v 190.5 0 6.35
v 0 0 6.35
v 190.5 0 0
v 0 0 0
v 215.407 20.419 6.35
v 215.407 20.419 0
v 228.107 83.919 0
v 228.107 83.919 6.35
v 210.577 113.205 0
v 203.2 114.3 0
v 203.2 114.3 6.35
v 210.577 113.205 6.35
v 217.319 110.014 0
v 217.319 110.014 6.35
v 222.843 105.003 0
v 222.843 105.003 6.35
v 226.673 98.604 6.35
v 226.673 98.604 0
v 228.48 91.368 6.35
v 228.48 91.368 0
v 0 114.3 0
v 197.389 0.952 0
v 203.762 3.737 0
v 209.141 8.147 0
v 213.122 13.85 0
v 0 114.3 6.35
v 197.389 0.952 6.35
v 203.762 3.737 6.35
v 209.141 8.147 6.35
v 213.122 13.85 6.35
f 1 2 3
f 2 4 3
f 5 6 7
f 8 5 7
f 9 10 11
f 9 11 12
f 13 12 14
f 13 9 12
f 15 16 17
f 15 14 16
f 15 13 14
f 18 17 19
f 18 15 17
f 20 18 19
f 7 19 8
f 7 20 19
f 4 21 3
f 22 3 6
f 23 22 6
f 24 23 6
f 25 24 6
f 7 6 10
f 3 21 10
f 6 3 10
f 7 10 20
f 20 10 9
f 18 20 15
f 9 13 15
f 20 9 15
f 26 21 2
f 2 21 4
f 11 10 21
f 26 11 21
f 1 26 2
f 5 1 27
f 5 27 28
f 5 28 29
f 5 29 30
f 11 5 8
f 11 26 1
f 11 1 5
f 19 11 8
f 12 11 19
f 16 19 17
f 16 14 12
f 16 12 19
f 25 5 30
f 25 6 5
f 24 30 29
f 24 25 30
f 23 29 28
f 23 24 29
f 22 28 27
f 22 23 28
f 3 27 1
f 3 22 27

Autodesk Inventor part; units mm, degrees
ref_plane "YZ Plane" through (0, 0, 0) normal (1, 0, 0) x (0, 1, 0)
ref_plane "XZ Plane" through (0, 0, 0) normal (0, 1, 0) x (-1, 0, 0)
ref_plane "XY Plane" through (0, 0, 0) normal (0, 0, 1) x (1, 0, 0)
sketch "Sketch1" plane through (0, 0, 0) normal (0, 0, 1) x (1, 0, 0)
  line L0 (0, 0) -> (190.5, 0)
  arc A0 (190.5, 0) -> (215.4067, 20.4187) centre (190.5, 25.4) ccw
  line L1 (215.4067, 20.4187) -> (228.1067, 83.9187)
  arc A1 (228.1067, 83.9187) -> (203.2, 114.3) centre (203.2, 88.9) ccw
  line L2 (203.2, 114.3) -> (0, 114.3)
  line L3 (0, 114.3) -> (0, 0)
  dimension "d4" = 25.4
  dimension "d5" = 25.4
  dimension "d6" = 228.6
  dimension "d9" = 114.3
extrude "Extrusion1" add sketch "Sketch1" along normal blind 6.35
properties part number "ImprintPart1"
